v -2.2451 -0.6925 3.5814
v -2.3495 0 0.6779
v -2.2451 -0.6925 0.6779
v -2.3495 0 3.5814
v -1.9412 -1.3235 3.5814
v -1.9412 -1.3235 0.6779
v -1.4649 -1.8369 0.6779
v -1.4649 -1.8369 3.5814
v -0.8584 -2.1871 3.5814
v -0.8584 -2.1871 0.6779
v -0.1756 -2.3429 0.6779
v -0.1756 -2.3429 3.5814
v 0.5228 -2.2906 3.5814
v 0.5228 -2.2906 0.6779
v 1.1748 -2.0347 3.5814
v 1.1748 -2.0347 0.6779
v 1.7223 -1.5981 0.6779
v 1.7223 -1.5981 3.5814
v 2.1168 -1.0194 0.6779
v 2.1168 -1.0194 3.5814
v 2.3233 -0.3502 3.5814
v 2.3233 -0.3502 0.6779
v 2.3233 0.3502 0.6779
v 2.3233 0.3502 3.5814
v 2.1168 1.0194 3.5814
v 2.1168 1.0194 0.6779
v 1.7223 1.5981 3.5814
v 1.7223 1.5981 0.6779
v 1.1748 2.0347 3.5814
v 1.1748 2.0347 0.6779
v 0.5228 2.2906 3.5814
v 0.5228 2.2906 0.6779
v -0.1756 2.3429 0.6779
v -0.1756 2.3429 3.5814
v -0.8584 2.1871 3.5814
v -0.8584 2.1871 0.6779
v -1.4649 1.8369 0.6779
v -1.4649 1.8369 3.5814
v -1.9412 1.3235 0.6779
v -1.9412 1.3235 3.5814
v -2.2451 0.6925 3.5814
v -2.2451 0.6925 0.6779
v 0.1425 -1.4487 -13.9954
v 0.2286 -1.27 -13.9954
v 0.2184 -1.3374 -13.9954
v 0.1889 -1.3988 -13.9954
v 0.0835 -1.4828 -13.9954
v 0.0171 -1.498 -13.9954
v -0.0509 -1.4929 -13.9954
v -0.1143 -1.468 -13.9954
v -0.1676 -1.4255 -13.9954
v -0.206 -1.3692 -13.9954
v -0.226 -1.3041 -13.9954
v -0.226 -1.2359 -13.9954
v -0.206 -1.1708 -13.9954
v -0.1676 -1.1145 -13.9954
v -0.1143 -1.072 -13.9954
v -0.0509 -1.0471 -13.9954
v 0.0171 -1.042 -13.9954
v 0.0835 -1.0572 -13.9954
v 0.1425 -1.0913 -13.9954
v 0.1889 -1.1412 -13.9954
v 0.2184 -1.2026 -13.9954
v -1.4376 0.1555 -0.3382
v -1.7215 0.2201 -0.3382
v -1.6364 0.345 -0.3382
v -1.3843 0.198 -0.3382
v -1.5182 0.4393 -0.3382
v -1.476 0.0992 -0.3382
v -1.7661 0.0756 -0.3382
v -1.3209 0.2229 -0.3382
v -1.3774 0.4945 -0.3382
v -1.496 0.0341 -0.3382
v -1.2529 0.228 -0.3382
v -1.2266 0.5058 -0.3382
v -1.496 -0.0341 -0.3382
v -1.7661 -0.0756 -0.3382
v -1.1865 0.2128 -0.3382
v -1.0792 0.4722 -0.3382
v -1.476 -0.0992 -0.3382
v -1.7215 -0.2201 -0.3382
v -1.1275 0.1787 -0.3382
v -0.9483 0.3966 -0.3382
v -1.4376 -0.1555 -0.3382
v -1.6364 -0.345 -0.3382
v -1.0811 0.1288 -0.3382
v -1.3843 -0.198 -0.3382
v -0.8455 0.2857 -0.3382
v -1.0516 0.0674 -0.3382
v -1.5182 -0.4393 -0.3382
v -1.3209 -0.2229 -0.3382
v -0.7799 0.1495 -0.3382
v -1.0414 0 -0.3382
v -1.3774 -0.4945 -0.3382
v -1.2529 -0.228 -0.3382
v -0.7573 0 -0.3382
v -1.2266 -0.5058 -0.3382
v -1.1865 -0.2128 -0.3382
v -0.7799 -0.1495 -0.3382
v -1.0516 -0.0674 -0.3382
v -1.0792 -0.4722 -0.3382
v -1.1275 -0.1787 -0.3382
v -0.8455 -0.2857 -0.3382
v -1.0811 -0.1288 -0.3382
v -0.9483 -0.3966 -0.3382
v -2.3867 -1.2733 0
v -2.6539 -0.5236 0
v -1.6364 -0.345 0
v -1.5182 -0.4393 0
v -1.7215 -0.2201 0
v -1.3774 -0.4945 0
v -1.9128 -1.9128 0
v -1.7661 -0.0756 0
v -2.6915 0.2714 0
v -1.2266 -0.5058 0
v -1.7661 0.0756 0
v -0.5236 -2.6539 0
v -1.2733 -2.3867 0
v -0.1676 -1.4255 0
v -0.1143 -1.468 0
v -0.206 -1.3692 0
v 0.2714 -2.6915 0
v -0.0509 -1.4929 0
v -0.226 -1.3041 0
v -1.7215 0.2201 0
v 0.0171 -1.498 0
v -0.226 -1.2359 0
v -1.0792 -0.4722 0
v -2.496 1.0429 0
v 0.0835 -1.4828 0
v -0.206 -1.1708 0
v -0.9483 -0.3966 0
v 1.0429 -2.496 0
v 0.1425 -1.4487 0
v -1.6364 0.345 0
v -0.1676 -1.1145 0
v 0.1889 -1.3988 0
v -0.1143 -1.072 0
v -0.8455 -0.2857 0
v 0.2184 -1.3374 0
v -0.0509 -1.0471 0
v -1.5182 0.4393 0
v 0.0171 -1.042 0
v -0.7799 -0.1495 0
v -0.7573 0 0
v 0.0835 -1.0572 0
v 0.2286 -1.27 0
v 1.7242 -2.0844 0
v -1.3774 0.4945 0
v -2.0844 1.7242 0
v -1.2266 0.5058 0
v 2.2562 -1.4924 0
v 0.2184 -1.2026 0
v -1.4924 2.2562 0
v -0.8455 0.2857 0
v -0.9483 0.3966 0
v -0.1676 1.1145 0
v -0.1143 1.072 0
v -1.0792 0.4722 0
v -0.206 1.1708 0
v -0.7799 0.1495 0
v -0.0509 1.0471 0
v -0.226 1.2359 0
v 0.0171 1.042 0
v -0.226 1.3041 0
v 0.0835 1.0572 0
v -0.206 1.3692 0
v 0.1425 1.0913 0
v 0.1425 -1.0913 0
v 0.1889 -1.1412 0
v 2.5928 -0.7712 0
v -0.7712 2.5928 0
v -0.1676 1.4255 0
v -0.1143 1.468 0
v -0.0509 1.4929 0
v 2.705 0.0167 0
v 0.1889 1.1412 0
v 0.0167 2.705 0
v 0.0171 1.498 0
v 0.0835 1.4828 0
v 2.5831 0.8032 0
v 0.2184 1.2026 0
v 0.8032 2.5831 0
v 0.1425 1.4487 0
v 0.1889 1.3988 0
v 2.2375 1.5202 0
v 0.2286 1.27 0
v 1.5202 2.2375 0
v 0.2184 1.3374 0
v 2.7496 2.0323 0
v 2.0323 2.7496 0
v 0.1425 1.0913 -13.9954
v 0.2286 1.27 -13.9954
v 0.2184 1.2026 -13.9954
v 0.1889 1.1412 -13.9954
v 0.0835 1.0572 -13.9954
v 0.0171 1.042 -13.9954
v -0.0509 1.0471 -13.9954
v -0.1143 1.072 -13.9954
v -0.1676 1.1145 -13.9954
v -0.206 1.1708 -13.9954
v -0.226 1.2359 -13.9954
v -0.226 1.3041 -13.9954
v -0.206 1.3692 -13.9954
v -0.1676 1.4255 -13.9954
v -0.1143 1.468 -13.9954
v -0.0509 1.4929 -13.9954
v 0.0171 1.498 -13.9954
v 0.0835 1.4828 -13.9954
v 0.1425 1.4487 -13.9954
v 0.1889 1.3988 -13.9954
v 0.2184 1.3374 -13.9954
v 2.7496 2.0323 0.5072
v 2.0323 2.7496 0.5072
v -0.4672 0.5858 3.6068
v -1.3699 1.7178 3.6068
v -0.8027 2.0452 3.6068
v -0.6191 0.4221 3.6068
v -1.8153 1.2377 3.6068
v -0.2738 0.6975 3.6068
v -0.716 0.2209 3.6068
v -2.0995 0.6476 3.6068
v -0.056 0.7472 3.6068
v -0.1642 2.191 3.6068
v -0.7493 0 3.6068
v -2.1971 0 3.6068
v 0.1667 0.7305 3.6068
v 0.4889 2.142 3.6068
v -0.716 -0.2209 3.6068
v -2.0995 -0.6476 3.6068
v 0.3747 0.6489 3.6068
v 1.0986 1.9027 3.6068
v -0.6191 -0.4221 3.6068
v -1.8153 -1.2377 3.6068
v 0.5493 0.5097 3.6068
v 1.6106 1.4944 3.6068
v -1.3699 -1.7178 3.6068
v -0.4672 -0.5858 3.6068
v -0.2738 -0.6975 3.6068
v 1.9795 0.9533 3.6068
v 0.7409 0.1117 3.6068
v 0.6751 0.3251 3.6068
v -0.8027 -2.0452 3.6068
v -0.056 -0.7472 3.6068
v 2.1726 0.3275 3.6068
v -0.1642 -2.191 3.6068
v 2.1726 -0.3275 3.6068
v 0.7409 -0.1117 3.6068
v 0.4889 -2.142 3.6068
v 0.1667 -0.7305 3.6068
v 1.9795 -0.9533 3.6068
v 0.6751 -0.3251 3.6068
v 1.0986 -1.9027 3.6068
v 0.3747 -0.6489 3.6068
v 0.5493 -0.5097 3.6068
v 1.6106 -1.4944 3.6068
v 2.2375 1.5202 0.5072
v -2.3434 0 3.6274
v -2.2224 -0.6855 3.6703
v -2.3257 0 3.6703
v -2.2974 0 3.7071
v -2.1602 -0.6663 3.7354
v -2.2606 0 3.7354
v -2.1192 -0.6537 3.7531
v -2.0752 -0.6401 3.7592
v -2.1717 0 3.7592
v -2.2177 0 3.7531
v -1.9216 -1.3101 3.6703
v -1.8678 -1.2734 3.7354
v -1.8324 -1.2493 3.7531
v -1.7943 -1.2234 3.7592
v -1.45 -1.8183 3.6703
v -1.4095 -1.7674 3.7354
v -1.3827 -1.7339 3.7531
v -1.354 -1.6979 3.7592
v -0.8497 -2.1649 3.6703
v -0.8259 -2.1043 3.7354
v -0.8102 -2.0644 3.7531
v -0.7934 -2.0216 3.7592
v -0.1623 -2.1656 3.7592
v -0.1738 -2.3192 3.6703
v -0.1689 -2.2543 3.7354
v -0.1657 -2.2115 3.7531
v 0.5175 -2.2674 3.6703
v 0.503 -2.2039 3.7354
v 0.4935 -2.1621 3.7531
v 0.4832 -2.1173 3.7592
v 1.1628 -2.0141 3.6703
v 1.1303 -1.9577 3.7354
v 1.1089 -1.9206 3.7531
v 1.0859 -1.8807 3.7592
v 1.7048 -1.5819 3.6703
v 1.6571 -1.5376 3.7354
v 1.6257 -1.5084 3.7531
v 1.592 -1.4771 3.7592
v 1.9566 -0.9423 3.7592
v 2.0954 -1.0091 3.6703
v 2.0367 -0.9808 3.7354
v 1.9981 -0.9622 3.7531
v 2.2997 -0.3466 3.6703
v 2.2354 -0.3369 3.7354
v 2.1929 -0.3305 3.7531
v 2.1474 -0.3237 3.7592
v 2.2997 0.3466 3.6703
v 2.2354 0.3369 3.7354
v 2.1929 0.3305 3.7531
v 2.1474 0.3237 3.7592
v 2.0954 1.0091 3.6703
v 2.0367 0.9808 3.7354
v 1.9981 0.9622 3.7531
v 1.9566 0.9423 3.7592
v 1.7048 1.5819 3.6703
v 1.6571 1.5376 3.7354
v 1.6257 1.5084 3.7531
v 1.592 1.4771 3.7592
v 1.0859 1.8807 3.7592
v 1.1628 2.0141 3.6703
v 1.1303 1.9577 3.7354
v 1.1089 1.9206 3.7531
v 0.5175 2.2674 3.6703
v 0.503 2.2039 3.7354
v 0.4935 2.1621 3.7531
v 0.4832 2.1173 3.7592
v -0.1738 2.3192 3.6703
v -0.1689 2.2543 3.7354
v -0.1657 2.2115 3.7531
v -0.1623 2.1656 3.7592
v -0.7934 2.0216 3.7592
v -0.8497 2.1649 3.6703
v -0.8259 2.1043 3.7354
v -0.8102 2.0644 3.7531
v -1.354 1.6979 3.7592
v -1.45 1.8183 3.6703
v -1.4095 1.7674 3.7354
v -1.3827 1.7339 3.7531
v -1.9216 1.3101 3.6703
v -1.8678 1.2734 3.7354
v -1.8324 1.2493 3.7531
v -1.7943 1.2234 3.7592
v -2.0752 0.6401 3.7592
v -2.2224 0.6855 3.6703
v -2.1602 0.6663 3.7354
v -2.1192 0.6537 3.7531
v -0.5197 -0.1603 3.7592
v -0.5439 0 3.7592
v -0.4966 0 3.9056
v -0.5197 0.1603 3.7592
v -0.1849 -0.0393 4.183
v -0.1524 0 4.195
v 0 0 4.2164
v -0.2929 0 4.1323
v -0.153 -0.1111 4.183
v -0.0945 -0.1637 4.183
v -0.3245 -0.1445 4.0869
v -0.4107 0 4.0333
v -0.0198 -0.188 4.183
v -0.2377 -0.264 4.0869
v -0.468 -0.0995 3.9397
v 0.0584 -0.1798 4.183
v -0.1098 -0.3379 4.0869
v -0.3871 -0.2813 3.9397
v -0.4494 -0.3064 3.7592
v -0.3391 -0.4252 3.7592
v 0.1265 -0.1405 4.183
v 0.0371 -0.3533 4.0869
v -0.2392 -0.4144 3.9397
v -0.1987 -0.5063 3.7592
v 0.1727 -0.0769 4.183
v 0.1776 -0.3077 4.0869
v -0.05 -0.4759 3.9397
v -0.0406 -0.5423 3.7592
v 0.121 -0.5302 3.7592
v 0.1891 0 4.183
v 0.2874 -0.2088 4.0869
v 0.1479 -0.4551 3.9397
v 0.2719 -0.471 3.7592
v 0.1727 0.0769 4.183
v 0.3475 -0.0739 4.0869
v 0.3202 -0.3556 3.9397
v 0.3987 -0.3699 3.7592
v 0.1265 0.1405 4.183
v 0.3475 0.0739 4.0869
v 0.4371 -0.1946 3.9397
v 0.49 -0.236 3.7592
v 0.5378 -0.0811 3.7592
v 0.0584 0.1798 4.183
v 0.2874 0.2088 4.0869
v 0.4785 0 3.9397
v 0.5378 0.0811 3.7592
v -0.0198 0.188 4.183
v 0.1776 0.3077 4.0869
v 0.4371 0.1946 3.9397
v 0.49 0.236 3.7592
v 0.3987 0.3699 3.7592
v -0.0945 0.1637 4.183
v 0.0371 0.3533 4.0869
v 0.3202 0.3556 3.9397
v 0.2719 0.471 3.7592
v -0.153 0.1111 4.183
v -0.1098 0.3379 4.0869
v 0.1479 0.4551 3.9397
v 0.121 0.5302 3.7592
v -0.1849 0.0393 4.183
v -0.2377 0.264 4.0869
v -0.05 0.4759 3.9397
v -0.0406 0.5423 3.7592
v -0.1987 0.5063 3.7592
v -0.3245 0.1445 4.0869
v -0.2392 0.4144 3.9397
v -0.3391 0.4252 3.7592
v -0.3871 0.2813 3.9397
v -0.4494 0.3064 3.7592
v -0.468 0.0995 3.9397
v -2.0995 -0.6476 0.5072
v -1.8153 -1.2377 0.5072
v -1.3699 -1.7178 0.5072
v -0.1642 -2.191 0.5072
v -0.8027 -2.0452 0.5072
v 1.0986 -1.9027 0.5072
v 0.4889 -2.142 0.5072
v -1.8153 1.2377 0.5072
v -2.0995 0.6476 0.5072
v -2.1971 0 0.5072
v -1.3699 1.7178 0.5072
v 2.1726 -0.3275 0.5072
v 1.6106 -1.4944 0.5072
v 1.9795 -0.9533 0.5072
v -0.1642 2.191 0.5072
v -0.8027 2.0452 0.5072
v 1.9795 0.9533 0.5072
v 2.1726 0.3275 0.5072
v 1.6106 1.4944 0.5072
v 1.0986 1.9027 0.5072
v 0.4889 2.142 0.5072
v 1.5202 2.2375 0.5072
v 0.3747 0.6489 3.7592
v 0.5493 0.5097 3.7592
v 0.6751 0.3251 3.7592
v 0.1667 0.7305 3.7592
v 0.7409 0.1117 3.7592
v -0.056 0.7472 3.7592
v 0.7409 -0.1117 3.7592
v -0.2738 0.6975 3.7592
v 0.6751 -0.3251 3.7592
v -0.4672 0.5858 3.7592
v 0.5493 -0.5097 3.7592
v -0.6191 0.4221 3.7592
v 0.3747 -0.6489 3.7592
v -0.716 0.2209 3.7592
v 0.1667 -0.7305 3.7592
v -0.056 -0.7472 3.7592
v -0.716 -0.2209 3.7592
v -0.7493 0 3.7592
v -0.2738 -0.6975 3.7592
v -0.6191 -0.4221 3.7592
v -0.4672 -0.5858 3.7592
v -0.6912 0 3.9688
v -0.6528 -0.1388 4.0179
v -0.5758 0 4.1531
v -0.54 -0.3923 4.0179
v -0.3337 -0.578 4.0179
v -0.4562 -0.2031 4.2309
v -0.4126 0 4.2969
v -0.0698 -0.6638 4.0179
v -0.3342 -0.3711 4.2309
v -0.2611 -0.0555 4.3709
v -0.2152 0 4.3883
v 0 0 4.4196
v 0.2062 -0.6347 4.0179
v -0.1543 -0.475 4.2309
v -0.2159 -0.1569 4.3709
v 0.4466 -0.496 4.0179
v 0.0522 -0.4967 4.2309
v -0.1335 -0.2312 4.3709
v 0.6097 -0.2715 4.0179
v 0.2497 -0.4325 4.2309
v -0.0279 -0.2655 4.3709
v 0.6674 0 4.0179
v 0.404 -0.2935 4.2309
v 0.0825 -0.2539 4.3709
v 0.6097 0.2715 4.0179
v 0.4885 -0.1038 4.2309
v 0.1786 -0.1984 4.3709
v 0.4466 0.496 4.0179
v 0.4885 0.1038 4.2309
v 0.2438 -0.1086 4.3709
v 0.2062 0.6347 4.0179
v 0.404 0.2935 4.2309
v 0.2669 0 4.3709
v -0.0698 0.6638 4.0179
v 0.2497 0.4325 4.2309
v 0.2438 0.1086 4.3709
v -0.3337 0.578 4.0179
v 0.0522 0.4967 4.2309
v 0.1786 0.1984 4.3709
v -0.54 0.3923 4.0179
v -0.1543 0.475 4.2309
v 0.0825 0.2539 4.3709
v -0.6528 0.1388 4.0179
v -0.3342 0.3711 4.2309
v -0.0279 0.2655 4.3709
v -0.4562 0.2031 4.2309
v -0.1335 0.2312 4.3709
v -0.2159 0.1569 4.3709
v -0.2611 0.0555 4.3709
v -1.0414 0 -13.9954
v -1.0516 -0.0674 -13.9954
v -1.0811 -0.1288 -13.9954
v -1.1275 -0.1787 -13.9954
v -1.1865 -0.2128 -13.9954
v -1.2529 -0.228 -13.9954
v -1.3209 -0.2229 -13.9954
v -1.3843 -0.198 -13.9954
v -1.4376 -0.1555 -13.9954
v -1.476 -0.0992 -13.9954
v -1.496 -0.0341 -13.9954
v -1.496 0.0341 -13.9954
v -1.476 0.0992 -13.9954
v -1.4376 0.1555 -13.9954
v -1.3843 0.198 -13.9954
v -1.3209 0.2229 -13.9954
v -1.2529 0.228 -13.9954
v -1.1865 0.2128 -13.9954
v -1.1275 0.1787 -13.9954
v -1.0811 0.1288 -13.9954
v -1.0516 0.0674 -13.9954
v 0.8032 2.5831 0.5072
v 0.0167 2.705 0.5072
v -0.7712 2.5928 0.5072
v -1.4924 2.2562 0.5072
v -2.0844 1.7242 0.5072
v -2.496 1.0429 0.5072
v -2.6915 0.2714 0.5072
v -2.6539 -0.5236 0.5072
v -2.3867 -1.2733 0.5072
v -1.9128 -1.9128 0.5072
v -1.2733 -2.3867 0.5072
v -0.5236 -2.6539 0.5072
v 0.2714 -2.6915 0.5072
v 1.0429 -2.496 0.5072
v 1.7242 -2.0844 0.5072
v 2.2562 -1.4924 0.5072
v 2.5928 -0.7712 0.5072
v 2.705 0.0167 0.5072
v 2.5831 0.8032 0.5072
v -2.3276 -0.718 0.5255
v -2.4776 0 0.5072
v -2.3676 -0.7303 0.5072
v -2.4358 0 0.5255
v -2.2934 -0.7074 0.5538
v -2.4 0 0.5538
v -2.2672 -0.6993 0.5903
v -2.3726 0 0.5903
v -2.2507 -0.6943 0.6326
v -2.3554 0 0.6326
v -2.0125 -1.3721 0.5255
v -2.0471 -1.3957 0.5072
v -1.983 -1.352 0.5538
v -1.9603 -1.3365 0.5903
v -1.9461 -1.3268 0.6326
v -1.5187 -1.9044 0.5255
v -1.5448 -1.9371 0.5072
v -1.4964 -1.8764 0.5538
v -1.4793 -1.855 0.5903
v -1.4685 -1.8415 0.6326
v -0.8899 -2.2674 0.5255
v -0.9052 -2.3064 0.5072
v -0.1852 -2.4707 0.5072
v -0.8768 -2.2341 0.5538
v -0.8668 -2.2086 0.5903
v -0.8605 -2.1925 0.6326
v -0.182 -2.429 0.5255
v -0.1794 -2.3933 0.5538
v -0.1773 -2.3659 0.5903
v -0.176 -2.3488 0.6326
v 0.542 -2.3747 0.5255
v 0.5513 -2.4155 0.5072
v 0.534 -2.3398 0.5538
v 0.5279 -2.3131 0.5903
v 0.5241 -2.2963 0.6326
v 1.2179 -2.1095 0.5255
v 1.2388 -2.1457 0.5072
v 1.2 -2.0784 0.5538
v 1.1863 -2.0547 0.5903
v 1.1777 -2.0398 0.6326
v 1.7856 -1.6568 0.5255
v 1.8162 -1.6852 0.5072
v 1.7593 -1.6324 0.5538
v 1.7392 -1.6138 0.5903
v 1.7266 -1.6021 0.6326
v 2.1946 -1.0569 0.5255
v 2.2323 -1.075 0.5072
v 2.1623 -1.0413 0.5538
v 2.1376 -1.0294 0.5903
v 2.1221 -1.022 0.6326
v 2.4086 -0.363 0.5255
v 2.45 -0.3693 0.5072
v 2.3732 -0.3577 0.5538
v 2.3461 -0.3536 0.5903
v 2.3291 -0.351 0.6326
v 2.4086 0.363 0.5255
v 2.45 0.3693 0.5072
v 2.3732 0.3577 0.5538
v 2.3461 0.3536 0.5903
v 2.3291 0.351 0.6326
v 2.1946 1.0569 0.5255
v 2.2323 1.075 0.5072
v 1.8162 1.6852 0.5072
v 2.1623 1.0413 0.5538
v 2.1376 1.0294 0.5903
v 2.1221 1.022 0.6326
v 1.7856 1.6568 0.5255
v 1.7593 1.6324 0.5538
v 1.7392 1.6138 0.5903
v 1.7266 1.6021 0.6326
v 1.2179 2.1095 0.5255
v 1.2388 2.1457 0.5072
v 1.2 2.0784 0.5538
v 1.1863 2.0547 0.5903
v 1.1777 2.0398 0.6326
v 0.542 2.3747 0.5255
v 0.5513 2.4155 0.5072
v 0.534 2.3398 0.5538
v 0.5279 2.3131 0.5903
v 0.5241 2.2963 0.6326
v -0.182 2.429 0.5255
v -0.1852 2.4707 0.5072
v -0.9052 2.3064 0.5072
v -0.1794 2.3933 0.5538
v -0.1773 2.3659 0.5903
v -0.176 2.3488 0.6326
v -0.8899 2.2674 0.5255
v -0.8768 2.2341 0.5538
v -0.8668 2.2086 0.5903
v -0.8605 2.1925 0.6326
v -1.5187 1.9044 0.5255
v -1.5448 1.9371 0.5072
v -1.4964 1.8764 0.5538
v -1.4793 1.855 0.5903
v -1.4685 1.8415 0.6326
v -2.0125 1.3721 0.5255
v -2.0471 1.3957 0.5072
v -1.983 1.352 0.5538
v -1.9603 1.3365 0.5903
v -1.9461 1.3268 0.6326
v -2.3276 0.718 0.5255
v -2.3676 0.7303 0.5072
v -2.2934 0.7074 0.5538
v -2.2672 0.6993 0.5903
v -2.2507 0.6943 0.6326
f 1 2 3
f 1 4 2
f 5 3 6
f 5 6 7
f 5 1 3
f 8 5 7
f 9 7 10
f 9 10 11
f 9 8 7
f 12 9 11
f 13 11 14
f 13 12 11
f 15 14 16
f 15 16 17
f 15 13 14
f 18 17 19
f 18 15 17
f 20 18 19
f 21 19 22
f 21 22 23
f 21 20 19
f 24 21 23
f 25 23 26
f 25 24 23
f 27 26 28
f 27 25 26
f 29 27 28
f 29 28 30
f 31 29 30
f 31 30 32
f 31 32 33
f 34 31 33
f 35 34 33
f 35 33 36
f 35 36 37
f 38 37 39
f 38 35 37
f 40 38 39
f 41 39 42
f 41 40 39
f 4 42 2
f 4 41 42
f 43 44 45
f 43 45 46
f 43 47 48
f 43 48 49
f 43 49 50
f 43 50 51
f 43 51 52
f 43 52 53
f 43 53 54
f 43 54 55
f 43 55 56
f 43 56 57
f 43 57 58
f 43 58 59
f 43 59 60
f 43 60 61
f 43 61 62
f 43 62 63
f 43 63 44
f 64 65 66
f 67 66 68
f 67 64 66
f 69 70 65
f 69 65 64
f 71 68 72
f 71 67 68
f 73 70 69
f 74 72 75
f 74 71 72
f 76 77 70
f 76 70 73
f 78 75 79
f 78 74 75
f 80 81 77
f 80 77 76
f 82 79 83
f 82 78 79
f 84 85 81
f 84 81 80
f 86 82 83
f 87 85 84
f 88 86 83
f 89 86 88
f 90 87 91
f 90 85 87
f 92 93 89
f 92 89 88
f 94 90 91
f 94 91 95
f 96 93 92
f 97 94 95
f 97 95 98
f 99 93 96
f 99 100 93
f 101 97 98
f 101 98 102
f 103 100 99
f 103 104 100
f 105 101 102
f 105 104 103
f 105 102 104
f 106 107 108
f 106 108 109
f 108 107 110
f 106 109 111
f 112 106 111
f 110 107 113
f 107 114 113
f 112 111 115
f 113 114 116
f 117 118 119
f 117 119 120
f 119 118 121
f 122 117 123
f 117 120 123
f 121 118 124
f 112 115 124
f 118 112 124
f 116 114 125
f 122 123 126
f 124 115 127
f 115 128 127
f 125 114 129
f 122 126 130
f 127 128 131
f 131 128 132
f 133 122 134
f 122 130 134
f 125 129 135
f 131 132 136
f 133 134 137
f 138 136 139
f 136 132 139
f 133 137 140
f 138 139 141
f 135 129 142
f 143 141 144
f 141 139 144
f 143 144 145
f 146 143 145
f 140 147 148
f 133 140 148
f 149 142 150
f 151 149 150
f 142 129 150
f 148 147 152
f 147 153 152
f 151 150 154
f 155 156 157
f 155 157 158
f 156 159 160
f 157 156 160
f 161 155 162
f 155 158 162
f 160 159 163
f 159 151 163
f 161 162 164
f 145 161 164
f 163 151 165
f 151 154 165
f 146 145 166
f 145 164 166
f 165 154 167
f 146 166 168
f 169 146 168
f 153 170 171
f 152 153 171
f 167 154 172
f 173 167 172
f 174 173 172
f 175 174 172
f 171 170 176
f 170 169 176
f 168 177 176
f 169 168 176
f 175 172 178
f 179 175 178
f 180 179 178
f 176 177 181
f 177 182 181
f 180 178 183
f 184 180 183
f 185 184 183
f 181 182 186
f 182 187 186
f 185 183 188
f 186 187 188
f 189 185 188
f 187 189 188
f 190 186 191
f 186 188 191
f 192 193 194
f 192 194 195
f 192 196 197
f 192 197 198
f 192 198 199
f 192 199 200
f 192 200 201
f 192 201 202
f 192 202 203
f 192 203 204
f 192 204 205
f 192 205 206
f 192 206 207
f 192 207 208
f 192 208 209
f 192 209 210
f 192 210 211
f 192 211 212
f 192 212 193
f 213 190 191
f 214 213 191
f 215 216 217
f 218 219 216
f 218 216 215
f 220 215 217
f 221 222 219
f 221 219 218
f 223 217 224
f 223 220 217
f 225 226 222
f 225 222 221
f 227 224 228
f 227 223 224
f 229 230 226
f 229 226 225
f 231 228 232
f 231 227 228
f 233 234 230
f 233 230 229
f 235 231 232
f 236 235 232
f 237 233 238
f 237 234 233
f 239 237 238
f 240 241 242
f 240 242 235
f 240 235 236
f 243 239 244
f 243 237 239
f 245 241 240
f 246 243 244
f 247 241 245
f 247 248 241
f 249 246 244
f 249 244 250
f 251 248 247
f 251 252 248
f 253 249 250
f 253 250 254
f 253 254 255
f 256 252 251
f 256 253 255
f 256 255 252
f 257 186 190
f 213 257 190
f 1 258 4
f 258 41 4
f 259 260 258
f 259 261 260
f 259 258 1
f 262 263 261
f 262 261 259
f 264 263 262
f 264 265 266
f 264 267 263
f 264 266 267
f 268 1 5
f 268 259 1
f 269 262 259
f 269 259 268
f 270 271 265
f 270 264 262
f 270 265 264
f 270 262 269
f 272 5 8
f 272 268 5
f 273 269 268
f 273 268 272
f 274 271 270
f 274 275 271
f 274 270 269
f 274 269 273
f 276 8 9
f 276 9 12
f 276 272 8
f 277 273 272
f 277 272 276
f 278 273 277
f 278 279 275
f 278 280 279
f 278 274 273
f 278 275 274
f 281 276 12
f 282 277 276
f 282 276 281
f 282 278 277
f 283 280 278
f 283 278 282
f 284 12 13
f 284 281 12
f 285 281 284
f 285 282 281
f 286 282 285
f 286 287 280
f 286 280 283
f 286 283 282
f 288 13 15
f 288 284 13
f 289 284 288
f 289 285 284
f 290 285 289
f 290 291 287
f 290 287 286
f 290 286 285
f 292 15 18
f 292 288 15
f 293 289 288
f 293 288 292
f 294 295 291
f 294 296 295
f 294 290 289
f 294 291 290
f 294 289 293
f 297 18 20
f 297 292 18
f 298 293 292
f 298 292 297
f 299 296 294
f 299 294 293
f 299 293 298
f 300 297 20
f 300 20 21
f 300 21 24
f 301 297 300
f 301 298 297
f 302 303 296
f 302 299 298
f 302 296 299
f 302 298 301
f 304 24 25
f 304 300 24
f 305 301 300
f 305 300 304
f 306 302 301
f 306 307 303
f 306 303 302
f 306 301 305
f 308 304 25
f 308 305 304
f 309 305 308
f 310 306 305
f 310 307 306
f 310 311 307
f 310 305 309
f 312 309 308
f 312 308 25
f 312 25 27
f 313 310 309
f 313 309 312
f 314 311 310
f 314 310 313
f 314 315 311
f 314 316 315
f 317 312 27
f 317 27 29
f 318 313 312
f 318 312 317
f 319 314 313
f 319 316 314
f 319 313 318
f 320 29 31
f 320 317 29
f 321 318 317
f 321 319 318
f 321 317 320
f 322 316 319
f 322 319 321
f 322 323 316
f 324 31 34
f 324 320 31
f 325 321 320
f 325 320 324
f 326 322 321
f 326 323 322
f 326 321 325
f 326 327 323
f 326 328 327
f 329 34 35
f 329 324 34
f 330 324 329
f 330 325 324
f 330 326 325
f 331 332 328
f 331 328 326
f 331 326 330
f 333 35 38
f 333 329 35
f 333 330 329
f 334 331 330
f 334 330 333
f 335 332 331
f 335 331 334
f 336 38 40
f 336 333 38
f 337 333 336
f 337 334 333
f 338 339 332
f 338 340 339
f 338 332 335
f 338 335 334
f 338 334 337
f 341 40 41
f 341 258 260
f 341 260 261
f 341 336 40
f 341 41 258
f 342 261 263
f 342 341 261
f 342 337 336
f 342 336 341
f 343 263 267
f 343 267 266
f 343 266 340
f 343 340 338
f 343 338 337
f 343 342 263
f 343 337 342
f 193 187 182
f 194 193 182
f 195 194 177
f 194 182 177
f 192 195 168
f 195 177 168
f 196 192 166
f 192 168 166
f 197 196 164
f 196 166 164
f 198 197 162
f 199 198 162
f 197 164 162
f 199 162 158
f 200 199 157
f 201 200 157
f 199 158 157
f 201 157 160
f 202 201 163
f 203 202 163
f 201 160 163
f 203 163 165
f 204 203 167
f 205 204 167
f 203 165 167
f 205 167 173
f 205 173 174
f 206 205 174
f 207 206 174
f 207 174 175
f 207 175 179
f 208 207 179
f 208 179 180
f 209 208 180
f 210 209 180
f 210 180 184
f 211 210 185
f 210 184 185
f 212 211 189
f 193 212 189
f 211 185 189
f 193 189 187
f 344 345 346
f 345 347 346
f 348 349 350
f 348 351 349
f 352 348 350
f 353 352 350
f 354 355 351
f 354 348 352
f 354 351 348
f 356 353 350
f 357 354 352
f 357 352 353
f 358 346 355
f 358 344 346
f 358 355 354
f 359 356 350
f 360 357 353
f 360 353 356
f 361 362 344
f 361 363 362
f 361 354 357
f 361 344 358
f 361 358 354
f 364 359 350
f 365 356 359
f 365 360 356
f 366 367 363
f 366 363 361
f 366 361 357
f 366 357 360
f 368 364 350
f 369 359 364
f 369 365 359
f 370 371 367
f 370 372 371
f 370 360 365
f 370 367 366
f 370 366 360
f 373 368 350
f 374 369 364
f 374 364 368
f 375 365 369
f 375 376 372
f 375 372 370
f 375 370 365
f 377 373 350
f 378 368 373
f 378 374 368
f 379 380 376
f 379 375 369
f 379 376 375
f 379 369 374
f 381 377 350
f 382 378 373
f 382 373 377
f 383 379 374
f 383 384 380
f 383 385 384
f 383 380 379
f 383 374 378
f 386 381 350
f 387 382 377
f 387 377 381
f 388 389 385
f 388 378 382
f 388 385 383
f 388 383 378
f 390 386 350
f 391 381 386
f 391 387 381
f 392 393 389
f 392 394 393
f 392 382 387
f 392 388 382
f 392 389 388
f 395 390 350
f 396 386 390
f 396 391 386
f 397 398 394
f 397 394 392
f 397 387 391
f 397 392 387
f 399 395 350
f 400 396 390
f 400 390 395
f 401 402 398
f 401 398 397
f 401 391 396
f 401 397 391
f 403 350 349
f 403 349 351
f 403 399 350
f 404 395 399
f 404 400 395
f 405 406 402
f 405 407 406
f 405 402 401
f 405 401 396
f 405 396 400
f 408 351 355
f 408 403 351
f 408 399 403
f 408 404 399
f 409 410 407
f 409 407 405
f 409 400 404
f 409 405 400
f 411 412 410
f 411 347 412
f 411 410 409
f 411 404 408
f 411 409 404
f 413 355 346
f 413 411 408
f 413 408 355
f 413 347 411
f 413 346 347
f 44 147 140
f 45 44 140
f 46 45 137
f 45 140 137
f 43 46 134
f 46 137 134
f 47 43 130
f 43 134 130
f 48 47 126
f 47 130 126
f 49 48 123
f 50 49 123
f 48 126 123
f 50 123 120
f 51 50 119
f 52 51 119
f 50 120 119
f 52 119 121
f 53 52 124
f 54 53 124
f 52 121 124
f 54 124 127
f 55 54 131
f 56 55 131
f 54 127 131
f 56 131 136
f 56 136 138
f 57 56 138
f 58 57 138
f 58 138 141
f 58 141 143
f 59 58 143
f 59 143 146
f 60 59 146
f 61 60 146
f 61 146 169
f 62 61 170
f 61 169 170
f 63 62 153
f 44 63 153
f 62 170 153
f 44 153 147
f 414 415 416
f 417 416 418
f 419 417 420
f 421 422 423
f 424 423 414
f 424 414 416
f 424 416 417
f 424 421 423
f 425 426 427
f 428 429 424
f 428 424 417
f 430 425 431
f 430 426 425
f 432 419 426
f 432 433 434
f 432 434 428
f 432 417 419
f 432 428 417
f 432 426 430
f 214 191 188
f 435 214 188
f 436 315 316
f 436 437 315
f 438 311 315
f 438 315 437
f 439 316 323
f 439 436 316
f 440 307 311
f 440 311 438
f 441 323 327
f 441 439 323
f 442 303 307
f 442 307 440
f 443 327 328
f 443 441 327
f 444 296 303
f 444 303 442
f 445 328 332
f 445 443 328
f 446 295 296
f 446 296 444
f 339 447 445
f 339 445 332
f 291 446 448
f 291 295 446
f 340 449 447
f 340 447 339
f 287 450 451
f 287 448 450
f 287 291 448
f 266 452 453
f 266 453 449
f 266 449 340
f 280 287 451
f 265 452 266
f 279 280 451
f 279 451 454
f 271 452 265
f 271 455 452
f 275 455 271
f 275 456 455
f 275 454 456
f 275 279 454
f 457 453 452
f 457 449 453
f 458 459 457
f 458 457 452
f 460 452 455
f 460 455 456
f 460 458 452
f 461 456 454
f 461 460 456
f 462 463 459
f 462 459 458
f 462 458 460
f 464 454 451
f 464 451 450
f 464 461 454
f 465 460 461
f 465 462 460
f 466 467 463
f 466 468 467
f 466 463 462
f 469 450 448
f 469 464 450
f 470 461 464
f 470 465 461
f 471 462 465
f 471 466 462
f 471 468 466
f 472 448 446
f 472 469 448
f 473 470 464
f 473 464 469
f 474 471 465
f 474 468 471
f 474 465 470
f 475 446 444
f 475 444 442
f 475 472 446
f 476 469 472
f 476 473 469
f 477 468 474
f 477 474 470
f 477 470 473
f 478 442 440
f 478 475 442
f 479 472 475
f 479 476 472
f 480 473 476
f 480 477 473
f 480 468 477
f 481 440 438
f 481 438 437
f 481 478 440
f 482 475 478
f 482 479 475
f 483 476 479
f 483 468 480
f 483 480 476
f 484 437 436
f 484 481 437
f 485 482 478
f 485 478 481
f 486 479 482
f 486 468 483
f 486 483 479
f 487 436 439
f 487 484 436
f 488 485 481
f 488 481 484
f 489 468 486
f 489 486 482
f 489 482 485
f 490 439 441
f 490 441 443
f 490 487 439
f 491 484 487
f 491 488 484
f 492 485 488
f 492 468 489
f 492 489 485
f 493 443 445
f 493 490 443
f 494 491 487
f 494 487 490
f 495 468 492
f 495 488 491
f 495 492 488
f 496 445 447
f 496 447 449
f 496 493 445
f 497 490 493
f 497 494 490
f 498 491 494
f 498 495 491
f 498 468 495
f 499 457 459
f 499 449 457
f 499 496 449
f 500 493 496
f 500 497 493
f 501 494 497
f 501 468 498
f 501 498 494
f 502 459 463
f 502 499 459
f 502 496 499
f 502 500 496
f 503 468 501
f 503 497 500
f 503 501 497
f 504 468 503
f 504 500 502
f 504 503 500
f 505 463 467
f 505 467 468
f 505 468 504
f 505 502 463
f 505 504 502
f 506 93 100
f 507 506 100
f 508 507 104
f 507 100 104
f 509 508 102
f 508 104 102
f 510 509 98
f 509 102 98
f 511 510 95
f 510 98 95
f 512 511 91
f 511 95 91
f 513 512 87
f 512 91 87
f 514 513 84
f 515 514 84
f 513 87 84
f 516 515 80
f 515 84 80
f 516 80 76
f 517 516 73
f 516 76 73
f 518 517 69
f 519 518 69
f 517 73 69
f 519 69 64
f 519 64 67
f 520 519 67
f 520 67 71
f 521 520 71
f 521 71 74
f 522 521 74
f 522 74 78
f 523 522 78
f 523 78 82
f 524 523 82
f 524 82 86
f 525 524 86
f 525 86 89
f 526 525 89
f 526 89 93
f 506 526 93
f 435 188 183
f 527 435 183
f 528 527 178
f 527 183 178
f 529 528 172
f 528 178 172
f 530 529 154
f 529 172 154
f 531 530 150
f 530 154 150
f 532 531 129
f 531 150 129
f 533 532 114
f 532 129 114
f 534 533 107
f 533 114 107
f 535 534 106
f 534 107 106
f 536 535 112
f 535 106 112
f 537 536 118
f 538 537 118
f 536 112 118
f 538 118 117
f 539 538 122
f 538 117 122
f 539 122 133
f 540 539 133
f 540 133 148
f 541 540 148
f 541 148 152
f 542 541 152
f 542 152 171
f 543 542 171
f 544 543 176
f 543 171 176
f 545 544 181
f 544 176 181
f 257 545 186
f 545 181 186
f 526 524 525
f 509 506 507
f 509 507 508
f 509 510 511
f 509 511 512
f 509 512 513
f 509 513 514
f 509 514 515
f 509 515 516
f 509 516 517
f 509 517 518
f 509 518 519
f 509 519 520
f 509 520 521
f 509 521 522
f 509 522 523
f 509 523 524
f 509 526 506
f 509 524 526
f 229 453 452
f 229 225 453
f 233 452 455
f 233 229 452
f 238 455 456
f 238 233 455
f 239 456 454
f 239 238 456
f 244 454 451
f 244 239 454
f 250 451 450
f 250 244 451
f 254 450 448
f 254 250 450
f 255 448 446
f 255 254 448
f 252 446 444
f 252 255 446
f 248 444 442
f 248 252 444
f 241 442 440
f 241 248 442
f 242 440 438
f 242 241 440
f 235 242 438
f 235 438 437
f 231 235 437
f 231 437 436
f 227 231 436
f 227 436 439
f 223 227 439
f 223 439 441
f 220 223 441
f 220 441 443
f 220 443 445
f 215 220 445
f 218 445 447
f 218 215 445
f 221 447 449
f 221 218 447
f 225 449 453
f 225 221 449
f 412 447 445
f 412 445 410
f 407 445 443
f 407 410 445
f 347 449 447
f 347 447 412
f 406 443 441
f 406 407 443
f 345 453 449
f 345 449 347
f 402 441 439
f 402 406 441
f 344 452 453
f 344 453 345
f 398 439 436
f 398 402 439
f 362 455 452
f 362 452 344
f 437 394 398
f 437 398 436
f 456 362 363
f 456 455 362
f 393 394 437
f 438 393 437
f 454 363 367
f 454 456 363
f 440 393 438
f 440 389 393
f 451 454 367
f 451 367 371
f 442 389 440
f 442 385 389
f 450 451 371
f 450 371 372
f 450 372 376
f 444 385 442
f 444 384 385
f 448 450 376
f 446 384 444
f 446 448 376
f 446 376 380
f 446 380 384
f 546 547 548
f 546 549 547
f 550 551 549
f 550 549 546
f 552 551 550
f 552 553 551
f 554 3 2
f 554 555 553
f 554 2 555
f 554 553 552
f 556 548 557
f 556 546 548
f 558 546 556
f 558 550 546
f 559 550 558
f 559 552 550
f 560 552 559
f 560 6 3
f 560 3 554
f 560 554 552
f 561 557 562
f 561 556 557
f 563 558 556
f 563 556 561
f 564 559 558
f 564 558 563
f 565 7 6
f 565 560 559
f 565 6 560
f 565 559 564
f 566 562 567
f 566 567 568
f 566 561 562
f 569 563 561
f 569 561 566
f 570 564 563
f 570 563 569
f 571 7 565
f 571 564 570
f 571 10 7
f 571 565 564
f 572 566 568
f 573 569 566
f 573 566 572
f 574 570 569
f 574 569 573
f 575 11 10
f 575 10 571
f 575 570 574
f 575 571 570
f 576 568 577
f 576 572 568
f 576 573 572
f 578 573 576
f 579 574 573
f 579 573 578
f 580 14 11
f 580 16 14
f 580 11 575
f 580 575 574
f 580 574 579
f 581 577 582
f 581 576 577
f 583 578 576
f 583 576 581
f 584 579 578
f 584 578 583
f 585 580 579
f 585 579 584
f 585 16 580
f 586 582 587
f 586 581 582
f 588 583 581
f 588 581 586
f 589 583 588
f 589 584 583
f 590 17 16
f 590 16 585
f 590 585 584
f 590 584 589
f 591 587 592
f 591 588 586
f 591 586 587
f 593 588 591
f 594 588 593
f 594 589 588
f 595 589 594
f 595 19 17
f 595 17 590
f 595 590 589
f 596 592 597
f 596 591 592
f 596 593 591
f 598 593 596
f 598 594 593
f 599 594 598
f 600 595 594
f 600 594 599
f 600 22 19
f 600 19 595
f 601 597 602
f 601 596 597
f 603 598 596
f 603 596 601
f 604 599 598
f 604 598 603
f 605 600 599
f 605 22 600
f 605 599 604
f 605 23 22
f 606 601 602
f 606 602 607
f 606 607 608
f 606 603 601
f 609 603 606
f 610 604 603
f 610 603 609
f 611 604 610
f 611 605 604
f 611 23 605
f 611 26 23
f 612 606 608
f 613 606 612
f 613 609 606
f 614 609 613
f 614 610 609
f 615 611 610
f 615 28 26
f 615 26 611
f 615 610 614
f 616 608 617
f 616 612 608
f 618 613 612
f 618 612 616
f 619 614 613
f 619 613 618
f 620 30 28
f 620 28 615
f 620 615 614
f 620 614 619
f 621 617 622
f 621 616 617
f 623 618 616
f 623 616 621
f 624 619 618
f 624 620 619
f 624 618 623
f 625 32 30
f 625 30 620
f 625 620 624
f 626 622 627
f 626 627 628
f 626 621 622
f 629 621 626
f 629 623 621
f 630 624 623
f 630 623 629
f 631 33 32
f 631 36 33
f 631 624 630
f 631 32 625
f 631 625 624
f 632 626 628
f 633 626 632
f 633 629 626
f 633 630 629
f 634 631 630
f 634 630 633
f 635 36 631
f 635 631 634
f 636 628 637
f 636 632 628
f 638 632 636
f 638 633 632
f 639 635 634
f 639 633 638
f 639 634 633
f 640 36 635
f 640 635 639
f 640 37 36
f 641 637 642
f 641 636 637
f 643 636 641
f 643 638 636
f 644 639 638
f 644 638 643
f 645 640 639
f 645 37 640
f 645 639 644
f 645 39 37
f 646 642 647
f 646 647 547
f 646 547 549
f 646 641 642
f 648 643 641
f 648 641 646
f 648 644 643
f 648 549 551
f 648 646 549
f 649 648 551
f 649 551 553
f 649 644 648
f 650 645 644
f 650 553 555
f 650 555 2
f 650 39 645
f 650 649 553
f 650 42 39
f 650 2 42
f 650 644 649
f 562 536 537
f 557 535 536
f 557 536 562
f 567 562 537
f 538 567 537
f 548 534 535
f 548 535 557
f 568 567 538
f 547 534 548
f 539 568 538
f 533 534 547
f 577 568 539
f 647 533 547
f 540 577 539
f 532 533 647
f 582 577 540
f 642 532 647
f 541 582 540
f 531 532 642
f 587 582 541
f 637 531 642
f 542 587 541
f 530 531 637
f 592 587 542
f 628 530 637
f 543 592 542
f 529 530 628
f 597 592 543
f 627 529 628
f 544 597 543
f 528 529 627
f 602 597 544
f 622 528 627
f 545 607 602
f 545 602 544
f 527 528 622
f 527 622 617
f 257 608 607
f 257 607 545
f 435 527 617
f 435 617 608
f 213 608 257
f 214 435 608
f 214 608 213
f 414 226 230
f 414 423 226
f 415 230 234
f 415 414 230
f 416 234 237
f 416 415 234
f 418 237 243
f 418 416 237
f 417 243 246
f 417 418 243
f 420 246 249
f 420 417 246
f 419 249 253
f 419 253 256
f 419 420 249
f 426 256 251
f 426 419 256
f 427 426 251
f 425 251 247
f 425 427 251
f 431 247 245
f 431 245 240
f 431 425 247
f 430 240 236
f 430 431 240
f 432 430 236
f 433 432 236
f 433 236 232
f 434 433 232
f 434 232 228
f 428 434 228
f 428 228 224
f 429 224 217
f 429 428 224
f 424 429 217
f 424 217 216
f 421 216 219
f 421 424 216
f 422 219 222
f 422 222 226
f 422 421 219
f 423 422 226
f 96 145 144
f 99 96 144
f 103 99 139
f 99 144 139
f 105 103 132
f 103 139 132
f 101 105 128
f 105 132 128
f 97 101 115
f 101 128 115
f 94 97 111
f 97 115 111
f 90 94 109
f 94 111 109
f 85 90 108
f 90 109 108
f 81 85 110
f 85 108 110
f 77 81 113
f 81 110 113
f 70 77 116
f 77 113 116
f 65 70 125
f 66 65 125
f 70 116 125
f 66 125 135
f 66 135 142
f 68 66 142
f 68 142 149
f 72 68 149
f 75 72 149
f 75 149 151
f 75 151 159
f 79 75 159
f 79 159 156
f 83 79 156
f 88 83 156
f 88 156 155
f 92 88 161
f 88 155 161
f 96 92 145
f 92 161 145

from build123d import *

# Parameters (mm, degrees)
BOSS_EXTRUDE1_DEPTH = 0.5072126
SKETCH7_R           = 0.2286
BOSS_EXTRUDE2_DEPTH = 13.9954
SKETCH8_R           = 0.5072126
BOSS_EXTRUDE3_DEPTH = 0.3381502


with BuildPart() as part:
    # Sketch1 → Boss-Extrude1 (new body)
    with BuildSketch(Plane.XY):
        with BuildLine():
            Line((2.749646661, 2.032339723), (2.032339723, 2.749646661))
            Line((2.032339723, 2.749646661), (1.520216057, 2.237522995))
            ThreePointArc((1.520216057, 2.237522995), (-1.912794554, -1.912794554), (2.237522995, 1.520216057))
            Line((2.237522995, 1.520216057), (2.749646661, 2.032339723))
        make_face()
    extrude(amount=BOSS_EXTRUDE1_DEPTH)

    # Sketch4 → Revolve1 (revolve)
    with BuildSketch(Plane(origin=(0, 0, 0), x_dir=(0, 0, -1), z_dir=(1, 0, 0)), mode=Mode.PRIVATE) as revolve1_sk:
        with BuildLine():
            Line((-0.677937746, 2.3495), (-3.581399897, 2.3495))
            ThreePointArc((-3.581399897, 2.3495), (-3.707123483, 2.297423586), (-3.759199897, 2.1717))
            Line((-3.759199897, 2.1717), (-3.759199897, 0.7493))
            Line((-3.759199897, 0.7493), (-3.606799897, 0.7493))
            Line((-3.606799897, 0.7493), (-3.606799897, 2.1971))
            Line((-3.606799897, 2.1971), (-0.5072126, 2.1971))
            Line((-0.5072126, 2.1971), (-0.5072126, 2.350316811))
            Line((-0.5072126, 2.350316811), (-0.5072126, 2.477643535))
            ThreePointArc((-0.5072126, 2.477643535), (-0.57120462, 2.38509986), (-0.677937746, 2.3495))
        make_face()
    revolve(revolve1_sk.sketch.rotate(Axis((0, 0, 0.5072126), (0, 0, 1)), 90), axis=Axis((0, 0, 0.5072126), (0, 0, 1)))  # turned: the seam where the file's is

    # Sketch7 → Boss-Extrude2 (add)
    with BuildSketch(Plane(origin=(0, 0, 0), x_dir=(-1, 0, 0), z_dir=(0, 0, -1))):
        with Locations(Location((0, -1.27, 0), (0, 0, 180))):  # turned: the seam where the file's is
            Circle(SKETCH7_R)
        with Locations(Location((1.27, 0, 0), (0, 0, 180))):  # turned: the seam where the file's is
            Circle(SKETCH7_R)
        with Locations(Location((0, 1.27, 0), (0, 0, 180))):  # turned: the seam where the file's is
            Circle(SKETCH7_R)
    extrude(amount=BOSS_EXTRUDE2_DEPTH)

    # Sketch8 → Boss-Extrude3 (add)
    with BuildSketch(Plane(origin=(0, 0, 0), x_dir=(-1, 0, 0), z_dir=(0, 0, -1))):
        with Locations(Location((1.264550567, 0, 0), (0, 0, 180))):  # turned: the seam where the file's is
            Circle(SKETCH8_R)
    extrude(amount=BOSS_EXTRUDE3_DEPTH)


with BuildPart() as body_2:
    # Sketch11 → Revolve3 (revolve)
    with BuildSketch(Plane(origin=(0, 0, 0), x_dir=(1, 0, 0), z_dir=(0, 1, 0))):
        with BuildLine():
            Line((0, -4.419599897), (0, -4.216399897))
            ThreePointArc((0, -4.216399897), (-0.355255293, -4.086915389), (-0.543868967, -3.759199897))
            Line((-0.543868967, -3.759199897), (-0.7493, -3.759199897))
            ThreePointArc((-0.7493, -3.759199897), (-0.499394296, -4.230936694), (0, -4.419599897))
        make_face()
    revolve(axis=Axis((0, 0, 3.759199897), (0, 0, 1)))


solid = Compound([part.part, body_2.part])
